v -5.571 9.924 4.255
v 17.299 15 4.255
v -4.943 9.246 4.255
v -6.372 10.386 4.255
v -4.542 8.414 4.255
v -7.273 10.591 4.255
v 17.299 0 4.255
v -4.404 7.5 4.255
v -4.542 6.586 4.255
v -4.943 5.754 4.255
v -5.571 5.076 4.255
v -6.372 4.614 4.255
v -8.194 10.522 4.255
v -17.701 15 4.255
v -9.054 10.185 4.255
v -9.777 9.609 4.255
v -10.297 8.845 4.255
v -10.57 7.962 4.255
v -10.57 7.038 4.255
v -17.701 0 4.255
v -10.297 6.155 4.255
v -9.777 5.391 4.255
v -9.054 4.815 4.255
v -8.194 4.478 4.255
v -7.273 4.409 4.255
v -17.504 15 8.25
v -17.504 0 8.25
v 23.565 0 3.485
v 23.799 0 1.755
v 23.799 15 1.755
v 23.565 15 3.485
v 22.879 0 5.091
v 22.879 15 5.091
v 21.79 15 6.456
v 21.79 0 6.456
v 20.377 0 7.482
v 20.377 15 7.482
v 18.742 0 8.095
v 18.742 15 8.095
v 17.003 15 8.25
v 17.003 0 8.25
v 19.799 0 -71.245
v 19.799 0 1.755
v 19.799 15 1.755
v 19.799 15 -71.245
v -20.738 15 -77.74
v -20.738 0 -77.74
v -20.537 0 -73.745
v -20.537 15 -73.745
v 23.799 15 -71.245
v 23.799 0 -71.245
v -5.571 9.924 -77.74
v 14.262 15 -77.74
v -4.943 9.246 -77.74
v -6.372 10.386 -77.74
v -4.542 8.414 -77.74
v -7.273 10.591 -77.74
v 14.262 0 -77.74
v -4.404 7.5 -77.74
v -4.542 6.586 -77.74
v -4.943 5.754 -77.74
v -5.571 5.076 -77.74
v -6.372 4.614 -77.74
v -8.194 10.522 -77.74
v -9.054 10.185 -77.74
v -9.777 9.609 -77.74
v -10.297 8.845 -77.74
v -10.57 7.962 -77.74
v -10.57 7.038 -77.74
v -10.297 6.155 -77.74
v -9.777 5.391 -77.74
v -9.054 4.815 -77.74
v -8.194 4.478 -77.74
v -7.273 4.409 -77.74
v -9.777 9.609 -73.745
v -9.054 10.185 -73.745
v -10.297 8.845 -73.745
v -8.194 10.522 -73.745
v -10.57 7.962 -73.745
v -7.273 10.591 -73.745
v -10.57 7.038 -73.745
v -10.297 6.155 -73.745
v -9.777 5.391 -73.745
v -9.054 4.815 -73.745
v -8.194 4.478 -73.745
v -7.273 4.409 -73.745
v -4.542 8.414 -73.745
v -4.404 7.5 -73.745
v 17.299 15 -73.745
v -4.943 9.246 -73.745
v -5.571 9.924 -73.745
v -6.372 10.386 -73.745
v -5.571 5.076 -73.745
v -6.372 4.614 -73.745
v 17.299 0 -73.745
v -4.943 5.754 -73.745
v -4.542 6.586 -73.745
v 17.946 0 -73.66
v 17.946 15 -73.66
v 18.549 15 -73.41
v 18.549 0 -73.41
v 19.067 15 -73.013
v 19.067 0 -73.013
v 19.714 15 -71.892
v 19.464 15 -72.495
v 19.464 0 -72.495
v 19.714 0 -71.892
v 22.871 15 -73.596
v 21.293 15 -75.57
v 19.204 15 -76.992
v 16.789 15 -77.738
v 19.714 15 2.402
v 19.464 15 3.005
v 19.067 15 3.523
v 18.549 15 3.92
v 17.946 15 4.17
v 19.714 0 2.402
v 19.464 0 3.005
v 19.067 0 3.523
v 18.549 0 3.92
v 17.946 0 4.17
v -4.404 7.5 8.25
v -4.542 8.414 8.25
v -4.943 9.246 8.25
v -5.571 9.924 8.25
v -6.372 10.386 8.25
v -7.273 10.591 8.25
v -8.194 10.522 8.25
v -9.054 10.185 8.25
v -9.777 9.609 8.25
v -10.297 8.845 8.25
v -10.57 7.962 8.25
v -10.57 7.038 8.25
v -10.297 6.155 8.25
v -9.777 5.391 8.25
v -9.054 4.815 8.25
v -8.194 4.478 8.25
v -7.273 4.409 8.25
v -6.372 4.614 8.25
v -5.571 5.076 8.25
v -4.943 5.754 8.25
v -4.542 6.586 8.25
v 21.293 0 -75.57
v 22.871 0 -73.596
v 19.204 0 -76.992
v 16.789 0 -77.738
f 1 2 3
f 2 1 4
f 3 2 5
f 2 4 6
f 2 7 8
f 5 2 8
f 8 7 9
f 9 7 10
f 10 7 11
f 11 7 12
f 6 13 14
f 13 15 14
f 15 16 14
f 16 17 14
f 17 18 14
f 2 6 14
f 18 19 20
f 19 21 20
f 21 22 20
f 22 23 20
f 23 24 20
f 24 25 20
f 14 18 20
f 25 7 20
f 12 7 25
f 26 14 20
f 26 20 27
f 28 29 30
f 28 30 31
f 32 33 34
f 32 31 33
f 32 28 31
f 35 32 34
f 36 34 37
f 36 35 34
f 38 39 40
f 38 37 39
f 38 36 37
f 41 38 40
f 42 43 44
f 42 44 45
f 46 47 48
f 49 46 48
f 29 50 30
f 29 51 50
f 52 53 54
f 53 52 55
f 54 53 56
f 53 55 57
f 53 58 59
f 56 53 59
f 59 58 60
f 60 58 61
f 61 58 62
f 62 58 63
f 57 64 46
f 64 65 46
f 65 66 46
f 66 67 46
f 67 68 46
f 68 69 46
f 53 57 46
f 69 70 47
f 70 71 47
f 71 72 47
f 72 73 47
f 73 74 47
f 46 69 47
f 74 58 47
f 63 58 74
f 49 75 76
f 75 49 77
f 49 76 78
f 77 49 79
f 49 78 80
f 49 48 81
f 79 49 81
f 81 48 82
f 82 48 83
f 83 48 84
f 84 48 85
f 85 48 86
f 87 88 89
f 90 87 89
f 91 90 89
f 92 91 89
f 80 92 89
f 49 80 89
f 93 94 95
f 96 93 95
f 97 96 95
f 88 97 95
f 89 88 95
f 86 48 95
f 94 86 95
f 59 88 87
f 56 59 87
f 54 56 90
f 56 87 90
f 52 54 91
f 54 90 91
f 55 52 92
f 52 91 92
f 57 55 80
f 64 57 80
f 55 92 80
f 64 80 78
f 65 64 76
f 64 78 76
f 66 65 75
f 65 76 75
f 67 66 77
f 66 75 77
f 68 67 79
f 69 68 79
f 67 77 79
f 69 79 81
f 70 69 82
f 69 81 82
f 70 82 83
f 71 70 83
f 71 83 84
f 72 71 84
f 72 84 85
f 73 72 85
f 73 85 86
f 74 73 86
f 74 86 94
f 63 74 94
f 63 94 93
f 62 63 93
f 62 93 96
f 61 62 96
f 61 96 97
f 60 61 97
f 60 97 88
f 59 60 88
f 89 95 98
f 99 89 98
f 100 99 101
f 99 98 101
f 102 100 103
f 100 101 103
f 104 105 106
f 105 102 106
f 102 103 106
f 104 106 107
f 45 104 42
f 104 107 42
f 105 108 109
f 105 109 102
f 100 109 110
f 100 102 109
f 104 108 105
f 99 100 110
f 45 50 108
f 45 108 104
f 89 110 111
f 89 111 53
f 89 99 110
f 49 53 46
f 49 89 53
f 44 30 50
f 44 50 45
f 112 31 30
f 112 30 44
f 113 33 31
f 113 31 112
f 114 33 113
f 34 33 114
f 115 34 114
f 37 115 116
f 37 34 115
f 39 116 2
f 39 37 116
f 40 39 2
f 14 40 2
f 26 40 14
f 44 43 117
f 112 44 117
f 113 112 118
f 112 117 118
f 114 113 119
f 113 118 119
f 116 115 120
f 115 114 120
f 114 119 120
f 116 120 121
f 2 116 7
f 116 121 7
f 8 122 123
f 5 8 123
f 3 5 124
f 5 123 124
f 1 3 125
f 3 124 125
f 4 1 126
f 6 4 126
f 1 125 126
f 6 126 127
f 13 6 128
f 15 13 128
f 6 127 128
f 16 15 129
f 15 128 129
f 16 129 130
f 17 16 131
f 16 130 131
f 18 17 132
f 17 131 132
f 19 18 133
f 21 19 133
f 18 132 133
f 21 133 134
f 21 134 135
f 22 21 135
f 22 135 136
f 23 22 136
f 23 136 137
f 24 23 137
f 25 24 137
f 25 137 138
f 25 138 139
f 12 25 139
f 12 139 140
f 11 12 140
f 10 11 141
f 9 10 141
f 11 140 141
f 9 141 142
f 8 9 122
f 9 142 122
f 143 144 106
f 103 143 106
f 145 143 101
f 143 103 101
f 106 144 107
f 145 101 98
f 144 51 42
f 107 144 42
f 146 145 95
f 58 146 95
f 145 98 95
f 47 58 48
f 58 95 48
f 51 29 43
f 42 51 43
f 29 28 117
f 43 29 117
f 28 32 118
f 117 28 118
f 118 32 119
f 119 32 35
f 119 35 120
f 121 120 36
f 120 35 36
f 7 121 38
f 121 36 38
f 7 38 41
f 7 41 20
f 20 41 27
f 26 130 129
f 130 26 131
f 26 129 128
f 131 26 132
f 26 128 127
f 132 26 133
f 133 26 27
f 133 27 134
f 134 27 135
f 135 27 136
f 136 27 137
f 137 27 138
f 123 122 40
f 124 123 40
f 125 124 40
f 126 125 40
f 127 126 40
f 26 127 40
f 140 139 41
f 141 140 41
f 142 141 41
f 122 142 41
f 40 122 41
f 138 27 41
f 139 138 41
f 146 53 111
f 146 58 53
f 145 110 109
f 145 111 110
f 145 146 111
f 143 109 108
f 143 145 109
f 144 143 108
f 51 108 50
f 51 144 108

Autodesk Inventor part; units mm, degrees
ref_plane "YZ Plane" through (0, 0, 0) normal (1, 0, 0) x (0, 1, 0)
ref_plane "XZ Plane" through (0, 0, 0) normal (0, 1, 0) x (-1, 0, 0)
ref_plane "XY Plane" through (0, 0, 0) normal (0, 0, 1) x (1, 0, 0)
sketch "Sketch1" plane through (0, 0, 0) normal (0, 1, 0) x (-1, 0, 0)
  line L0 (20.5369, -73.7451) -> (-17.2994, -73.7451)
  line L1 (-14.2617, -77.74) -> (20.7383, -77.74)
  line L2 (20.7383, -77.74) -> (20.5369, -73.7451)
  line L3 (17.5042, 8.2501) -> (-17.003, 8.2501)
  line L4 (-17.2994, 4.2549) -> (17.7006, 4.2549)
  line L5 (17.7006, 4.2549) -> (17.5042, 8.2501)
  line L6 (-23.7994, -71.2451) -> (-23.7994, 1.7549)
  line L7 (-19.7994, 1.7549) -> (-19.7994, -71.2451)
  arc A0 (-17.2994, 4.2549) -> (-19.7994, 1.7549) centre (-17.2994, 1.7549) ccw
  arc A1 (-17.003, 8.2501) -> (-23.7994, 1.7549) centre (-17.2994, 1.7569) ccw
  arc A2 (-19.7994, -71.2451) -> (-17.2994, -73.7451) centre (-17.2994, -71.2451) ccw
  arc A3 (-23.7994, -71.2451) -> (-14.2617, -77.74) centre (-15.5172, -69.3332) ccw
  point P0 (0, 0)
  dimension "d2" = 4
  dimension "d3" = 4
  dimension "d4" = 35
  dimension "d5" = 35
  dimension "d29" = 78
  dimension "d31" = 73
  dimension "d33" = 2.5
  dimension "d34" = 2.5
  dimension "d36" = 2.5
  dimension "d37" = 4
  dimension "d38" = 6.5
  dimension "d39" = 2.5
  dimension "d41" = 8.5
extrude "Extrusion1" add sketch "Sketch1" along normal blind 15
sketch "Sketch2" plane through (-17.5042, 0, 8.2501) normal (0, 0, 1) x (1, 0, 0)
  circle A0 centre (10, 7.5) radius 3.1
  line L0 (0, 15) -> (34.5072, 15) projected
  line L1 (0, 0) -> (0, 15) projected
  point P0 (17.5042, 0)
  dimension "d19" = 6.2
  dimension "d20" = 7.5
  dimension "d21" = 10
extrude "Extrusion2" cut sketch "Sketch2" against normal blind 120
sketch "Sketch3" plane through (12.7652, 0, -83.1298) normal (-1, 0, 0) x (0, 0, 1)
  circle A0 centre (45, 7.5) radius 3.1
  line L0 (0, 15) -> (90, 15) projected
  line L1 (-6.5, 0) -> (-6.5, 15) projected
  point P0 (83.1298, 0)
  dimension "d24" = 6.2
  dimension "d25" = 7.5
  dimension "d26" = 51.5
extrude "Extrusion3" [suppressed]
properties part number "Side bar holding bracket"
